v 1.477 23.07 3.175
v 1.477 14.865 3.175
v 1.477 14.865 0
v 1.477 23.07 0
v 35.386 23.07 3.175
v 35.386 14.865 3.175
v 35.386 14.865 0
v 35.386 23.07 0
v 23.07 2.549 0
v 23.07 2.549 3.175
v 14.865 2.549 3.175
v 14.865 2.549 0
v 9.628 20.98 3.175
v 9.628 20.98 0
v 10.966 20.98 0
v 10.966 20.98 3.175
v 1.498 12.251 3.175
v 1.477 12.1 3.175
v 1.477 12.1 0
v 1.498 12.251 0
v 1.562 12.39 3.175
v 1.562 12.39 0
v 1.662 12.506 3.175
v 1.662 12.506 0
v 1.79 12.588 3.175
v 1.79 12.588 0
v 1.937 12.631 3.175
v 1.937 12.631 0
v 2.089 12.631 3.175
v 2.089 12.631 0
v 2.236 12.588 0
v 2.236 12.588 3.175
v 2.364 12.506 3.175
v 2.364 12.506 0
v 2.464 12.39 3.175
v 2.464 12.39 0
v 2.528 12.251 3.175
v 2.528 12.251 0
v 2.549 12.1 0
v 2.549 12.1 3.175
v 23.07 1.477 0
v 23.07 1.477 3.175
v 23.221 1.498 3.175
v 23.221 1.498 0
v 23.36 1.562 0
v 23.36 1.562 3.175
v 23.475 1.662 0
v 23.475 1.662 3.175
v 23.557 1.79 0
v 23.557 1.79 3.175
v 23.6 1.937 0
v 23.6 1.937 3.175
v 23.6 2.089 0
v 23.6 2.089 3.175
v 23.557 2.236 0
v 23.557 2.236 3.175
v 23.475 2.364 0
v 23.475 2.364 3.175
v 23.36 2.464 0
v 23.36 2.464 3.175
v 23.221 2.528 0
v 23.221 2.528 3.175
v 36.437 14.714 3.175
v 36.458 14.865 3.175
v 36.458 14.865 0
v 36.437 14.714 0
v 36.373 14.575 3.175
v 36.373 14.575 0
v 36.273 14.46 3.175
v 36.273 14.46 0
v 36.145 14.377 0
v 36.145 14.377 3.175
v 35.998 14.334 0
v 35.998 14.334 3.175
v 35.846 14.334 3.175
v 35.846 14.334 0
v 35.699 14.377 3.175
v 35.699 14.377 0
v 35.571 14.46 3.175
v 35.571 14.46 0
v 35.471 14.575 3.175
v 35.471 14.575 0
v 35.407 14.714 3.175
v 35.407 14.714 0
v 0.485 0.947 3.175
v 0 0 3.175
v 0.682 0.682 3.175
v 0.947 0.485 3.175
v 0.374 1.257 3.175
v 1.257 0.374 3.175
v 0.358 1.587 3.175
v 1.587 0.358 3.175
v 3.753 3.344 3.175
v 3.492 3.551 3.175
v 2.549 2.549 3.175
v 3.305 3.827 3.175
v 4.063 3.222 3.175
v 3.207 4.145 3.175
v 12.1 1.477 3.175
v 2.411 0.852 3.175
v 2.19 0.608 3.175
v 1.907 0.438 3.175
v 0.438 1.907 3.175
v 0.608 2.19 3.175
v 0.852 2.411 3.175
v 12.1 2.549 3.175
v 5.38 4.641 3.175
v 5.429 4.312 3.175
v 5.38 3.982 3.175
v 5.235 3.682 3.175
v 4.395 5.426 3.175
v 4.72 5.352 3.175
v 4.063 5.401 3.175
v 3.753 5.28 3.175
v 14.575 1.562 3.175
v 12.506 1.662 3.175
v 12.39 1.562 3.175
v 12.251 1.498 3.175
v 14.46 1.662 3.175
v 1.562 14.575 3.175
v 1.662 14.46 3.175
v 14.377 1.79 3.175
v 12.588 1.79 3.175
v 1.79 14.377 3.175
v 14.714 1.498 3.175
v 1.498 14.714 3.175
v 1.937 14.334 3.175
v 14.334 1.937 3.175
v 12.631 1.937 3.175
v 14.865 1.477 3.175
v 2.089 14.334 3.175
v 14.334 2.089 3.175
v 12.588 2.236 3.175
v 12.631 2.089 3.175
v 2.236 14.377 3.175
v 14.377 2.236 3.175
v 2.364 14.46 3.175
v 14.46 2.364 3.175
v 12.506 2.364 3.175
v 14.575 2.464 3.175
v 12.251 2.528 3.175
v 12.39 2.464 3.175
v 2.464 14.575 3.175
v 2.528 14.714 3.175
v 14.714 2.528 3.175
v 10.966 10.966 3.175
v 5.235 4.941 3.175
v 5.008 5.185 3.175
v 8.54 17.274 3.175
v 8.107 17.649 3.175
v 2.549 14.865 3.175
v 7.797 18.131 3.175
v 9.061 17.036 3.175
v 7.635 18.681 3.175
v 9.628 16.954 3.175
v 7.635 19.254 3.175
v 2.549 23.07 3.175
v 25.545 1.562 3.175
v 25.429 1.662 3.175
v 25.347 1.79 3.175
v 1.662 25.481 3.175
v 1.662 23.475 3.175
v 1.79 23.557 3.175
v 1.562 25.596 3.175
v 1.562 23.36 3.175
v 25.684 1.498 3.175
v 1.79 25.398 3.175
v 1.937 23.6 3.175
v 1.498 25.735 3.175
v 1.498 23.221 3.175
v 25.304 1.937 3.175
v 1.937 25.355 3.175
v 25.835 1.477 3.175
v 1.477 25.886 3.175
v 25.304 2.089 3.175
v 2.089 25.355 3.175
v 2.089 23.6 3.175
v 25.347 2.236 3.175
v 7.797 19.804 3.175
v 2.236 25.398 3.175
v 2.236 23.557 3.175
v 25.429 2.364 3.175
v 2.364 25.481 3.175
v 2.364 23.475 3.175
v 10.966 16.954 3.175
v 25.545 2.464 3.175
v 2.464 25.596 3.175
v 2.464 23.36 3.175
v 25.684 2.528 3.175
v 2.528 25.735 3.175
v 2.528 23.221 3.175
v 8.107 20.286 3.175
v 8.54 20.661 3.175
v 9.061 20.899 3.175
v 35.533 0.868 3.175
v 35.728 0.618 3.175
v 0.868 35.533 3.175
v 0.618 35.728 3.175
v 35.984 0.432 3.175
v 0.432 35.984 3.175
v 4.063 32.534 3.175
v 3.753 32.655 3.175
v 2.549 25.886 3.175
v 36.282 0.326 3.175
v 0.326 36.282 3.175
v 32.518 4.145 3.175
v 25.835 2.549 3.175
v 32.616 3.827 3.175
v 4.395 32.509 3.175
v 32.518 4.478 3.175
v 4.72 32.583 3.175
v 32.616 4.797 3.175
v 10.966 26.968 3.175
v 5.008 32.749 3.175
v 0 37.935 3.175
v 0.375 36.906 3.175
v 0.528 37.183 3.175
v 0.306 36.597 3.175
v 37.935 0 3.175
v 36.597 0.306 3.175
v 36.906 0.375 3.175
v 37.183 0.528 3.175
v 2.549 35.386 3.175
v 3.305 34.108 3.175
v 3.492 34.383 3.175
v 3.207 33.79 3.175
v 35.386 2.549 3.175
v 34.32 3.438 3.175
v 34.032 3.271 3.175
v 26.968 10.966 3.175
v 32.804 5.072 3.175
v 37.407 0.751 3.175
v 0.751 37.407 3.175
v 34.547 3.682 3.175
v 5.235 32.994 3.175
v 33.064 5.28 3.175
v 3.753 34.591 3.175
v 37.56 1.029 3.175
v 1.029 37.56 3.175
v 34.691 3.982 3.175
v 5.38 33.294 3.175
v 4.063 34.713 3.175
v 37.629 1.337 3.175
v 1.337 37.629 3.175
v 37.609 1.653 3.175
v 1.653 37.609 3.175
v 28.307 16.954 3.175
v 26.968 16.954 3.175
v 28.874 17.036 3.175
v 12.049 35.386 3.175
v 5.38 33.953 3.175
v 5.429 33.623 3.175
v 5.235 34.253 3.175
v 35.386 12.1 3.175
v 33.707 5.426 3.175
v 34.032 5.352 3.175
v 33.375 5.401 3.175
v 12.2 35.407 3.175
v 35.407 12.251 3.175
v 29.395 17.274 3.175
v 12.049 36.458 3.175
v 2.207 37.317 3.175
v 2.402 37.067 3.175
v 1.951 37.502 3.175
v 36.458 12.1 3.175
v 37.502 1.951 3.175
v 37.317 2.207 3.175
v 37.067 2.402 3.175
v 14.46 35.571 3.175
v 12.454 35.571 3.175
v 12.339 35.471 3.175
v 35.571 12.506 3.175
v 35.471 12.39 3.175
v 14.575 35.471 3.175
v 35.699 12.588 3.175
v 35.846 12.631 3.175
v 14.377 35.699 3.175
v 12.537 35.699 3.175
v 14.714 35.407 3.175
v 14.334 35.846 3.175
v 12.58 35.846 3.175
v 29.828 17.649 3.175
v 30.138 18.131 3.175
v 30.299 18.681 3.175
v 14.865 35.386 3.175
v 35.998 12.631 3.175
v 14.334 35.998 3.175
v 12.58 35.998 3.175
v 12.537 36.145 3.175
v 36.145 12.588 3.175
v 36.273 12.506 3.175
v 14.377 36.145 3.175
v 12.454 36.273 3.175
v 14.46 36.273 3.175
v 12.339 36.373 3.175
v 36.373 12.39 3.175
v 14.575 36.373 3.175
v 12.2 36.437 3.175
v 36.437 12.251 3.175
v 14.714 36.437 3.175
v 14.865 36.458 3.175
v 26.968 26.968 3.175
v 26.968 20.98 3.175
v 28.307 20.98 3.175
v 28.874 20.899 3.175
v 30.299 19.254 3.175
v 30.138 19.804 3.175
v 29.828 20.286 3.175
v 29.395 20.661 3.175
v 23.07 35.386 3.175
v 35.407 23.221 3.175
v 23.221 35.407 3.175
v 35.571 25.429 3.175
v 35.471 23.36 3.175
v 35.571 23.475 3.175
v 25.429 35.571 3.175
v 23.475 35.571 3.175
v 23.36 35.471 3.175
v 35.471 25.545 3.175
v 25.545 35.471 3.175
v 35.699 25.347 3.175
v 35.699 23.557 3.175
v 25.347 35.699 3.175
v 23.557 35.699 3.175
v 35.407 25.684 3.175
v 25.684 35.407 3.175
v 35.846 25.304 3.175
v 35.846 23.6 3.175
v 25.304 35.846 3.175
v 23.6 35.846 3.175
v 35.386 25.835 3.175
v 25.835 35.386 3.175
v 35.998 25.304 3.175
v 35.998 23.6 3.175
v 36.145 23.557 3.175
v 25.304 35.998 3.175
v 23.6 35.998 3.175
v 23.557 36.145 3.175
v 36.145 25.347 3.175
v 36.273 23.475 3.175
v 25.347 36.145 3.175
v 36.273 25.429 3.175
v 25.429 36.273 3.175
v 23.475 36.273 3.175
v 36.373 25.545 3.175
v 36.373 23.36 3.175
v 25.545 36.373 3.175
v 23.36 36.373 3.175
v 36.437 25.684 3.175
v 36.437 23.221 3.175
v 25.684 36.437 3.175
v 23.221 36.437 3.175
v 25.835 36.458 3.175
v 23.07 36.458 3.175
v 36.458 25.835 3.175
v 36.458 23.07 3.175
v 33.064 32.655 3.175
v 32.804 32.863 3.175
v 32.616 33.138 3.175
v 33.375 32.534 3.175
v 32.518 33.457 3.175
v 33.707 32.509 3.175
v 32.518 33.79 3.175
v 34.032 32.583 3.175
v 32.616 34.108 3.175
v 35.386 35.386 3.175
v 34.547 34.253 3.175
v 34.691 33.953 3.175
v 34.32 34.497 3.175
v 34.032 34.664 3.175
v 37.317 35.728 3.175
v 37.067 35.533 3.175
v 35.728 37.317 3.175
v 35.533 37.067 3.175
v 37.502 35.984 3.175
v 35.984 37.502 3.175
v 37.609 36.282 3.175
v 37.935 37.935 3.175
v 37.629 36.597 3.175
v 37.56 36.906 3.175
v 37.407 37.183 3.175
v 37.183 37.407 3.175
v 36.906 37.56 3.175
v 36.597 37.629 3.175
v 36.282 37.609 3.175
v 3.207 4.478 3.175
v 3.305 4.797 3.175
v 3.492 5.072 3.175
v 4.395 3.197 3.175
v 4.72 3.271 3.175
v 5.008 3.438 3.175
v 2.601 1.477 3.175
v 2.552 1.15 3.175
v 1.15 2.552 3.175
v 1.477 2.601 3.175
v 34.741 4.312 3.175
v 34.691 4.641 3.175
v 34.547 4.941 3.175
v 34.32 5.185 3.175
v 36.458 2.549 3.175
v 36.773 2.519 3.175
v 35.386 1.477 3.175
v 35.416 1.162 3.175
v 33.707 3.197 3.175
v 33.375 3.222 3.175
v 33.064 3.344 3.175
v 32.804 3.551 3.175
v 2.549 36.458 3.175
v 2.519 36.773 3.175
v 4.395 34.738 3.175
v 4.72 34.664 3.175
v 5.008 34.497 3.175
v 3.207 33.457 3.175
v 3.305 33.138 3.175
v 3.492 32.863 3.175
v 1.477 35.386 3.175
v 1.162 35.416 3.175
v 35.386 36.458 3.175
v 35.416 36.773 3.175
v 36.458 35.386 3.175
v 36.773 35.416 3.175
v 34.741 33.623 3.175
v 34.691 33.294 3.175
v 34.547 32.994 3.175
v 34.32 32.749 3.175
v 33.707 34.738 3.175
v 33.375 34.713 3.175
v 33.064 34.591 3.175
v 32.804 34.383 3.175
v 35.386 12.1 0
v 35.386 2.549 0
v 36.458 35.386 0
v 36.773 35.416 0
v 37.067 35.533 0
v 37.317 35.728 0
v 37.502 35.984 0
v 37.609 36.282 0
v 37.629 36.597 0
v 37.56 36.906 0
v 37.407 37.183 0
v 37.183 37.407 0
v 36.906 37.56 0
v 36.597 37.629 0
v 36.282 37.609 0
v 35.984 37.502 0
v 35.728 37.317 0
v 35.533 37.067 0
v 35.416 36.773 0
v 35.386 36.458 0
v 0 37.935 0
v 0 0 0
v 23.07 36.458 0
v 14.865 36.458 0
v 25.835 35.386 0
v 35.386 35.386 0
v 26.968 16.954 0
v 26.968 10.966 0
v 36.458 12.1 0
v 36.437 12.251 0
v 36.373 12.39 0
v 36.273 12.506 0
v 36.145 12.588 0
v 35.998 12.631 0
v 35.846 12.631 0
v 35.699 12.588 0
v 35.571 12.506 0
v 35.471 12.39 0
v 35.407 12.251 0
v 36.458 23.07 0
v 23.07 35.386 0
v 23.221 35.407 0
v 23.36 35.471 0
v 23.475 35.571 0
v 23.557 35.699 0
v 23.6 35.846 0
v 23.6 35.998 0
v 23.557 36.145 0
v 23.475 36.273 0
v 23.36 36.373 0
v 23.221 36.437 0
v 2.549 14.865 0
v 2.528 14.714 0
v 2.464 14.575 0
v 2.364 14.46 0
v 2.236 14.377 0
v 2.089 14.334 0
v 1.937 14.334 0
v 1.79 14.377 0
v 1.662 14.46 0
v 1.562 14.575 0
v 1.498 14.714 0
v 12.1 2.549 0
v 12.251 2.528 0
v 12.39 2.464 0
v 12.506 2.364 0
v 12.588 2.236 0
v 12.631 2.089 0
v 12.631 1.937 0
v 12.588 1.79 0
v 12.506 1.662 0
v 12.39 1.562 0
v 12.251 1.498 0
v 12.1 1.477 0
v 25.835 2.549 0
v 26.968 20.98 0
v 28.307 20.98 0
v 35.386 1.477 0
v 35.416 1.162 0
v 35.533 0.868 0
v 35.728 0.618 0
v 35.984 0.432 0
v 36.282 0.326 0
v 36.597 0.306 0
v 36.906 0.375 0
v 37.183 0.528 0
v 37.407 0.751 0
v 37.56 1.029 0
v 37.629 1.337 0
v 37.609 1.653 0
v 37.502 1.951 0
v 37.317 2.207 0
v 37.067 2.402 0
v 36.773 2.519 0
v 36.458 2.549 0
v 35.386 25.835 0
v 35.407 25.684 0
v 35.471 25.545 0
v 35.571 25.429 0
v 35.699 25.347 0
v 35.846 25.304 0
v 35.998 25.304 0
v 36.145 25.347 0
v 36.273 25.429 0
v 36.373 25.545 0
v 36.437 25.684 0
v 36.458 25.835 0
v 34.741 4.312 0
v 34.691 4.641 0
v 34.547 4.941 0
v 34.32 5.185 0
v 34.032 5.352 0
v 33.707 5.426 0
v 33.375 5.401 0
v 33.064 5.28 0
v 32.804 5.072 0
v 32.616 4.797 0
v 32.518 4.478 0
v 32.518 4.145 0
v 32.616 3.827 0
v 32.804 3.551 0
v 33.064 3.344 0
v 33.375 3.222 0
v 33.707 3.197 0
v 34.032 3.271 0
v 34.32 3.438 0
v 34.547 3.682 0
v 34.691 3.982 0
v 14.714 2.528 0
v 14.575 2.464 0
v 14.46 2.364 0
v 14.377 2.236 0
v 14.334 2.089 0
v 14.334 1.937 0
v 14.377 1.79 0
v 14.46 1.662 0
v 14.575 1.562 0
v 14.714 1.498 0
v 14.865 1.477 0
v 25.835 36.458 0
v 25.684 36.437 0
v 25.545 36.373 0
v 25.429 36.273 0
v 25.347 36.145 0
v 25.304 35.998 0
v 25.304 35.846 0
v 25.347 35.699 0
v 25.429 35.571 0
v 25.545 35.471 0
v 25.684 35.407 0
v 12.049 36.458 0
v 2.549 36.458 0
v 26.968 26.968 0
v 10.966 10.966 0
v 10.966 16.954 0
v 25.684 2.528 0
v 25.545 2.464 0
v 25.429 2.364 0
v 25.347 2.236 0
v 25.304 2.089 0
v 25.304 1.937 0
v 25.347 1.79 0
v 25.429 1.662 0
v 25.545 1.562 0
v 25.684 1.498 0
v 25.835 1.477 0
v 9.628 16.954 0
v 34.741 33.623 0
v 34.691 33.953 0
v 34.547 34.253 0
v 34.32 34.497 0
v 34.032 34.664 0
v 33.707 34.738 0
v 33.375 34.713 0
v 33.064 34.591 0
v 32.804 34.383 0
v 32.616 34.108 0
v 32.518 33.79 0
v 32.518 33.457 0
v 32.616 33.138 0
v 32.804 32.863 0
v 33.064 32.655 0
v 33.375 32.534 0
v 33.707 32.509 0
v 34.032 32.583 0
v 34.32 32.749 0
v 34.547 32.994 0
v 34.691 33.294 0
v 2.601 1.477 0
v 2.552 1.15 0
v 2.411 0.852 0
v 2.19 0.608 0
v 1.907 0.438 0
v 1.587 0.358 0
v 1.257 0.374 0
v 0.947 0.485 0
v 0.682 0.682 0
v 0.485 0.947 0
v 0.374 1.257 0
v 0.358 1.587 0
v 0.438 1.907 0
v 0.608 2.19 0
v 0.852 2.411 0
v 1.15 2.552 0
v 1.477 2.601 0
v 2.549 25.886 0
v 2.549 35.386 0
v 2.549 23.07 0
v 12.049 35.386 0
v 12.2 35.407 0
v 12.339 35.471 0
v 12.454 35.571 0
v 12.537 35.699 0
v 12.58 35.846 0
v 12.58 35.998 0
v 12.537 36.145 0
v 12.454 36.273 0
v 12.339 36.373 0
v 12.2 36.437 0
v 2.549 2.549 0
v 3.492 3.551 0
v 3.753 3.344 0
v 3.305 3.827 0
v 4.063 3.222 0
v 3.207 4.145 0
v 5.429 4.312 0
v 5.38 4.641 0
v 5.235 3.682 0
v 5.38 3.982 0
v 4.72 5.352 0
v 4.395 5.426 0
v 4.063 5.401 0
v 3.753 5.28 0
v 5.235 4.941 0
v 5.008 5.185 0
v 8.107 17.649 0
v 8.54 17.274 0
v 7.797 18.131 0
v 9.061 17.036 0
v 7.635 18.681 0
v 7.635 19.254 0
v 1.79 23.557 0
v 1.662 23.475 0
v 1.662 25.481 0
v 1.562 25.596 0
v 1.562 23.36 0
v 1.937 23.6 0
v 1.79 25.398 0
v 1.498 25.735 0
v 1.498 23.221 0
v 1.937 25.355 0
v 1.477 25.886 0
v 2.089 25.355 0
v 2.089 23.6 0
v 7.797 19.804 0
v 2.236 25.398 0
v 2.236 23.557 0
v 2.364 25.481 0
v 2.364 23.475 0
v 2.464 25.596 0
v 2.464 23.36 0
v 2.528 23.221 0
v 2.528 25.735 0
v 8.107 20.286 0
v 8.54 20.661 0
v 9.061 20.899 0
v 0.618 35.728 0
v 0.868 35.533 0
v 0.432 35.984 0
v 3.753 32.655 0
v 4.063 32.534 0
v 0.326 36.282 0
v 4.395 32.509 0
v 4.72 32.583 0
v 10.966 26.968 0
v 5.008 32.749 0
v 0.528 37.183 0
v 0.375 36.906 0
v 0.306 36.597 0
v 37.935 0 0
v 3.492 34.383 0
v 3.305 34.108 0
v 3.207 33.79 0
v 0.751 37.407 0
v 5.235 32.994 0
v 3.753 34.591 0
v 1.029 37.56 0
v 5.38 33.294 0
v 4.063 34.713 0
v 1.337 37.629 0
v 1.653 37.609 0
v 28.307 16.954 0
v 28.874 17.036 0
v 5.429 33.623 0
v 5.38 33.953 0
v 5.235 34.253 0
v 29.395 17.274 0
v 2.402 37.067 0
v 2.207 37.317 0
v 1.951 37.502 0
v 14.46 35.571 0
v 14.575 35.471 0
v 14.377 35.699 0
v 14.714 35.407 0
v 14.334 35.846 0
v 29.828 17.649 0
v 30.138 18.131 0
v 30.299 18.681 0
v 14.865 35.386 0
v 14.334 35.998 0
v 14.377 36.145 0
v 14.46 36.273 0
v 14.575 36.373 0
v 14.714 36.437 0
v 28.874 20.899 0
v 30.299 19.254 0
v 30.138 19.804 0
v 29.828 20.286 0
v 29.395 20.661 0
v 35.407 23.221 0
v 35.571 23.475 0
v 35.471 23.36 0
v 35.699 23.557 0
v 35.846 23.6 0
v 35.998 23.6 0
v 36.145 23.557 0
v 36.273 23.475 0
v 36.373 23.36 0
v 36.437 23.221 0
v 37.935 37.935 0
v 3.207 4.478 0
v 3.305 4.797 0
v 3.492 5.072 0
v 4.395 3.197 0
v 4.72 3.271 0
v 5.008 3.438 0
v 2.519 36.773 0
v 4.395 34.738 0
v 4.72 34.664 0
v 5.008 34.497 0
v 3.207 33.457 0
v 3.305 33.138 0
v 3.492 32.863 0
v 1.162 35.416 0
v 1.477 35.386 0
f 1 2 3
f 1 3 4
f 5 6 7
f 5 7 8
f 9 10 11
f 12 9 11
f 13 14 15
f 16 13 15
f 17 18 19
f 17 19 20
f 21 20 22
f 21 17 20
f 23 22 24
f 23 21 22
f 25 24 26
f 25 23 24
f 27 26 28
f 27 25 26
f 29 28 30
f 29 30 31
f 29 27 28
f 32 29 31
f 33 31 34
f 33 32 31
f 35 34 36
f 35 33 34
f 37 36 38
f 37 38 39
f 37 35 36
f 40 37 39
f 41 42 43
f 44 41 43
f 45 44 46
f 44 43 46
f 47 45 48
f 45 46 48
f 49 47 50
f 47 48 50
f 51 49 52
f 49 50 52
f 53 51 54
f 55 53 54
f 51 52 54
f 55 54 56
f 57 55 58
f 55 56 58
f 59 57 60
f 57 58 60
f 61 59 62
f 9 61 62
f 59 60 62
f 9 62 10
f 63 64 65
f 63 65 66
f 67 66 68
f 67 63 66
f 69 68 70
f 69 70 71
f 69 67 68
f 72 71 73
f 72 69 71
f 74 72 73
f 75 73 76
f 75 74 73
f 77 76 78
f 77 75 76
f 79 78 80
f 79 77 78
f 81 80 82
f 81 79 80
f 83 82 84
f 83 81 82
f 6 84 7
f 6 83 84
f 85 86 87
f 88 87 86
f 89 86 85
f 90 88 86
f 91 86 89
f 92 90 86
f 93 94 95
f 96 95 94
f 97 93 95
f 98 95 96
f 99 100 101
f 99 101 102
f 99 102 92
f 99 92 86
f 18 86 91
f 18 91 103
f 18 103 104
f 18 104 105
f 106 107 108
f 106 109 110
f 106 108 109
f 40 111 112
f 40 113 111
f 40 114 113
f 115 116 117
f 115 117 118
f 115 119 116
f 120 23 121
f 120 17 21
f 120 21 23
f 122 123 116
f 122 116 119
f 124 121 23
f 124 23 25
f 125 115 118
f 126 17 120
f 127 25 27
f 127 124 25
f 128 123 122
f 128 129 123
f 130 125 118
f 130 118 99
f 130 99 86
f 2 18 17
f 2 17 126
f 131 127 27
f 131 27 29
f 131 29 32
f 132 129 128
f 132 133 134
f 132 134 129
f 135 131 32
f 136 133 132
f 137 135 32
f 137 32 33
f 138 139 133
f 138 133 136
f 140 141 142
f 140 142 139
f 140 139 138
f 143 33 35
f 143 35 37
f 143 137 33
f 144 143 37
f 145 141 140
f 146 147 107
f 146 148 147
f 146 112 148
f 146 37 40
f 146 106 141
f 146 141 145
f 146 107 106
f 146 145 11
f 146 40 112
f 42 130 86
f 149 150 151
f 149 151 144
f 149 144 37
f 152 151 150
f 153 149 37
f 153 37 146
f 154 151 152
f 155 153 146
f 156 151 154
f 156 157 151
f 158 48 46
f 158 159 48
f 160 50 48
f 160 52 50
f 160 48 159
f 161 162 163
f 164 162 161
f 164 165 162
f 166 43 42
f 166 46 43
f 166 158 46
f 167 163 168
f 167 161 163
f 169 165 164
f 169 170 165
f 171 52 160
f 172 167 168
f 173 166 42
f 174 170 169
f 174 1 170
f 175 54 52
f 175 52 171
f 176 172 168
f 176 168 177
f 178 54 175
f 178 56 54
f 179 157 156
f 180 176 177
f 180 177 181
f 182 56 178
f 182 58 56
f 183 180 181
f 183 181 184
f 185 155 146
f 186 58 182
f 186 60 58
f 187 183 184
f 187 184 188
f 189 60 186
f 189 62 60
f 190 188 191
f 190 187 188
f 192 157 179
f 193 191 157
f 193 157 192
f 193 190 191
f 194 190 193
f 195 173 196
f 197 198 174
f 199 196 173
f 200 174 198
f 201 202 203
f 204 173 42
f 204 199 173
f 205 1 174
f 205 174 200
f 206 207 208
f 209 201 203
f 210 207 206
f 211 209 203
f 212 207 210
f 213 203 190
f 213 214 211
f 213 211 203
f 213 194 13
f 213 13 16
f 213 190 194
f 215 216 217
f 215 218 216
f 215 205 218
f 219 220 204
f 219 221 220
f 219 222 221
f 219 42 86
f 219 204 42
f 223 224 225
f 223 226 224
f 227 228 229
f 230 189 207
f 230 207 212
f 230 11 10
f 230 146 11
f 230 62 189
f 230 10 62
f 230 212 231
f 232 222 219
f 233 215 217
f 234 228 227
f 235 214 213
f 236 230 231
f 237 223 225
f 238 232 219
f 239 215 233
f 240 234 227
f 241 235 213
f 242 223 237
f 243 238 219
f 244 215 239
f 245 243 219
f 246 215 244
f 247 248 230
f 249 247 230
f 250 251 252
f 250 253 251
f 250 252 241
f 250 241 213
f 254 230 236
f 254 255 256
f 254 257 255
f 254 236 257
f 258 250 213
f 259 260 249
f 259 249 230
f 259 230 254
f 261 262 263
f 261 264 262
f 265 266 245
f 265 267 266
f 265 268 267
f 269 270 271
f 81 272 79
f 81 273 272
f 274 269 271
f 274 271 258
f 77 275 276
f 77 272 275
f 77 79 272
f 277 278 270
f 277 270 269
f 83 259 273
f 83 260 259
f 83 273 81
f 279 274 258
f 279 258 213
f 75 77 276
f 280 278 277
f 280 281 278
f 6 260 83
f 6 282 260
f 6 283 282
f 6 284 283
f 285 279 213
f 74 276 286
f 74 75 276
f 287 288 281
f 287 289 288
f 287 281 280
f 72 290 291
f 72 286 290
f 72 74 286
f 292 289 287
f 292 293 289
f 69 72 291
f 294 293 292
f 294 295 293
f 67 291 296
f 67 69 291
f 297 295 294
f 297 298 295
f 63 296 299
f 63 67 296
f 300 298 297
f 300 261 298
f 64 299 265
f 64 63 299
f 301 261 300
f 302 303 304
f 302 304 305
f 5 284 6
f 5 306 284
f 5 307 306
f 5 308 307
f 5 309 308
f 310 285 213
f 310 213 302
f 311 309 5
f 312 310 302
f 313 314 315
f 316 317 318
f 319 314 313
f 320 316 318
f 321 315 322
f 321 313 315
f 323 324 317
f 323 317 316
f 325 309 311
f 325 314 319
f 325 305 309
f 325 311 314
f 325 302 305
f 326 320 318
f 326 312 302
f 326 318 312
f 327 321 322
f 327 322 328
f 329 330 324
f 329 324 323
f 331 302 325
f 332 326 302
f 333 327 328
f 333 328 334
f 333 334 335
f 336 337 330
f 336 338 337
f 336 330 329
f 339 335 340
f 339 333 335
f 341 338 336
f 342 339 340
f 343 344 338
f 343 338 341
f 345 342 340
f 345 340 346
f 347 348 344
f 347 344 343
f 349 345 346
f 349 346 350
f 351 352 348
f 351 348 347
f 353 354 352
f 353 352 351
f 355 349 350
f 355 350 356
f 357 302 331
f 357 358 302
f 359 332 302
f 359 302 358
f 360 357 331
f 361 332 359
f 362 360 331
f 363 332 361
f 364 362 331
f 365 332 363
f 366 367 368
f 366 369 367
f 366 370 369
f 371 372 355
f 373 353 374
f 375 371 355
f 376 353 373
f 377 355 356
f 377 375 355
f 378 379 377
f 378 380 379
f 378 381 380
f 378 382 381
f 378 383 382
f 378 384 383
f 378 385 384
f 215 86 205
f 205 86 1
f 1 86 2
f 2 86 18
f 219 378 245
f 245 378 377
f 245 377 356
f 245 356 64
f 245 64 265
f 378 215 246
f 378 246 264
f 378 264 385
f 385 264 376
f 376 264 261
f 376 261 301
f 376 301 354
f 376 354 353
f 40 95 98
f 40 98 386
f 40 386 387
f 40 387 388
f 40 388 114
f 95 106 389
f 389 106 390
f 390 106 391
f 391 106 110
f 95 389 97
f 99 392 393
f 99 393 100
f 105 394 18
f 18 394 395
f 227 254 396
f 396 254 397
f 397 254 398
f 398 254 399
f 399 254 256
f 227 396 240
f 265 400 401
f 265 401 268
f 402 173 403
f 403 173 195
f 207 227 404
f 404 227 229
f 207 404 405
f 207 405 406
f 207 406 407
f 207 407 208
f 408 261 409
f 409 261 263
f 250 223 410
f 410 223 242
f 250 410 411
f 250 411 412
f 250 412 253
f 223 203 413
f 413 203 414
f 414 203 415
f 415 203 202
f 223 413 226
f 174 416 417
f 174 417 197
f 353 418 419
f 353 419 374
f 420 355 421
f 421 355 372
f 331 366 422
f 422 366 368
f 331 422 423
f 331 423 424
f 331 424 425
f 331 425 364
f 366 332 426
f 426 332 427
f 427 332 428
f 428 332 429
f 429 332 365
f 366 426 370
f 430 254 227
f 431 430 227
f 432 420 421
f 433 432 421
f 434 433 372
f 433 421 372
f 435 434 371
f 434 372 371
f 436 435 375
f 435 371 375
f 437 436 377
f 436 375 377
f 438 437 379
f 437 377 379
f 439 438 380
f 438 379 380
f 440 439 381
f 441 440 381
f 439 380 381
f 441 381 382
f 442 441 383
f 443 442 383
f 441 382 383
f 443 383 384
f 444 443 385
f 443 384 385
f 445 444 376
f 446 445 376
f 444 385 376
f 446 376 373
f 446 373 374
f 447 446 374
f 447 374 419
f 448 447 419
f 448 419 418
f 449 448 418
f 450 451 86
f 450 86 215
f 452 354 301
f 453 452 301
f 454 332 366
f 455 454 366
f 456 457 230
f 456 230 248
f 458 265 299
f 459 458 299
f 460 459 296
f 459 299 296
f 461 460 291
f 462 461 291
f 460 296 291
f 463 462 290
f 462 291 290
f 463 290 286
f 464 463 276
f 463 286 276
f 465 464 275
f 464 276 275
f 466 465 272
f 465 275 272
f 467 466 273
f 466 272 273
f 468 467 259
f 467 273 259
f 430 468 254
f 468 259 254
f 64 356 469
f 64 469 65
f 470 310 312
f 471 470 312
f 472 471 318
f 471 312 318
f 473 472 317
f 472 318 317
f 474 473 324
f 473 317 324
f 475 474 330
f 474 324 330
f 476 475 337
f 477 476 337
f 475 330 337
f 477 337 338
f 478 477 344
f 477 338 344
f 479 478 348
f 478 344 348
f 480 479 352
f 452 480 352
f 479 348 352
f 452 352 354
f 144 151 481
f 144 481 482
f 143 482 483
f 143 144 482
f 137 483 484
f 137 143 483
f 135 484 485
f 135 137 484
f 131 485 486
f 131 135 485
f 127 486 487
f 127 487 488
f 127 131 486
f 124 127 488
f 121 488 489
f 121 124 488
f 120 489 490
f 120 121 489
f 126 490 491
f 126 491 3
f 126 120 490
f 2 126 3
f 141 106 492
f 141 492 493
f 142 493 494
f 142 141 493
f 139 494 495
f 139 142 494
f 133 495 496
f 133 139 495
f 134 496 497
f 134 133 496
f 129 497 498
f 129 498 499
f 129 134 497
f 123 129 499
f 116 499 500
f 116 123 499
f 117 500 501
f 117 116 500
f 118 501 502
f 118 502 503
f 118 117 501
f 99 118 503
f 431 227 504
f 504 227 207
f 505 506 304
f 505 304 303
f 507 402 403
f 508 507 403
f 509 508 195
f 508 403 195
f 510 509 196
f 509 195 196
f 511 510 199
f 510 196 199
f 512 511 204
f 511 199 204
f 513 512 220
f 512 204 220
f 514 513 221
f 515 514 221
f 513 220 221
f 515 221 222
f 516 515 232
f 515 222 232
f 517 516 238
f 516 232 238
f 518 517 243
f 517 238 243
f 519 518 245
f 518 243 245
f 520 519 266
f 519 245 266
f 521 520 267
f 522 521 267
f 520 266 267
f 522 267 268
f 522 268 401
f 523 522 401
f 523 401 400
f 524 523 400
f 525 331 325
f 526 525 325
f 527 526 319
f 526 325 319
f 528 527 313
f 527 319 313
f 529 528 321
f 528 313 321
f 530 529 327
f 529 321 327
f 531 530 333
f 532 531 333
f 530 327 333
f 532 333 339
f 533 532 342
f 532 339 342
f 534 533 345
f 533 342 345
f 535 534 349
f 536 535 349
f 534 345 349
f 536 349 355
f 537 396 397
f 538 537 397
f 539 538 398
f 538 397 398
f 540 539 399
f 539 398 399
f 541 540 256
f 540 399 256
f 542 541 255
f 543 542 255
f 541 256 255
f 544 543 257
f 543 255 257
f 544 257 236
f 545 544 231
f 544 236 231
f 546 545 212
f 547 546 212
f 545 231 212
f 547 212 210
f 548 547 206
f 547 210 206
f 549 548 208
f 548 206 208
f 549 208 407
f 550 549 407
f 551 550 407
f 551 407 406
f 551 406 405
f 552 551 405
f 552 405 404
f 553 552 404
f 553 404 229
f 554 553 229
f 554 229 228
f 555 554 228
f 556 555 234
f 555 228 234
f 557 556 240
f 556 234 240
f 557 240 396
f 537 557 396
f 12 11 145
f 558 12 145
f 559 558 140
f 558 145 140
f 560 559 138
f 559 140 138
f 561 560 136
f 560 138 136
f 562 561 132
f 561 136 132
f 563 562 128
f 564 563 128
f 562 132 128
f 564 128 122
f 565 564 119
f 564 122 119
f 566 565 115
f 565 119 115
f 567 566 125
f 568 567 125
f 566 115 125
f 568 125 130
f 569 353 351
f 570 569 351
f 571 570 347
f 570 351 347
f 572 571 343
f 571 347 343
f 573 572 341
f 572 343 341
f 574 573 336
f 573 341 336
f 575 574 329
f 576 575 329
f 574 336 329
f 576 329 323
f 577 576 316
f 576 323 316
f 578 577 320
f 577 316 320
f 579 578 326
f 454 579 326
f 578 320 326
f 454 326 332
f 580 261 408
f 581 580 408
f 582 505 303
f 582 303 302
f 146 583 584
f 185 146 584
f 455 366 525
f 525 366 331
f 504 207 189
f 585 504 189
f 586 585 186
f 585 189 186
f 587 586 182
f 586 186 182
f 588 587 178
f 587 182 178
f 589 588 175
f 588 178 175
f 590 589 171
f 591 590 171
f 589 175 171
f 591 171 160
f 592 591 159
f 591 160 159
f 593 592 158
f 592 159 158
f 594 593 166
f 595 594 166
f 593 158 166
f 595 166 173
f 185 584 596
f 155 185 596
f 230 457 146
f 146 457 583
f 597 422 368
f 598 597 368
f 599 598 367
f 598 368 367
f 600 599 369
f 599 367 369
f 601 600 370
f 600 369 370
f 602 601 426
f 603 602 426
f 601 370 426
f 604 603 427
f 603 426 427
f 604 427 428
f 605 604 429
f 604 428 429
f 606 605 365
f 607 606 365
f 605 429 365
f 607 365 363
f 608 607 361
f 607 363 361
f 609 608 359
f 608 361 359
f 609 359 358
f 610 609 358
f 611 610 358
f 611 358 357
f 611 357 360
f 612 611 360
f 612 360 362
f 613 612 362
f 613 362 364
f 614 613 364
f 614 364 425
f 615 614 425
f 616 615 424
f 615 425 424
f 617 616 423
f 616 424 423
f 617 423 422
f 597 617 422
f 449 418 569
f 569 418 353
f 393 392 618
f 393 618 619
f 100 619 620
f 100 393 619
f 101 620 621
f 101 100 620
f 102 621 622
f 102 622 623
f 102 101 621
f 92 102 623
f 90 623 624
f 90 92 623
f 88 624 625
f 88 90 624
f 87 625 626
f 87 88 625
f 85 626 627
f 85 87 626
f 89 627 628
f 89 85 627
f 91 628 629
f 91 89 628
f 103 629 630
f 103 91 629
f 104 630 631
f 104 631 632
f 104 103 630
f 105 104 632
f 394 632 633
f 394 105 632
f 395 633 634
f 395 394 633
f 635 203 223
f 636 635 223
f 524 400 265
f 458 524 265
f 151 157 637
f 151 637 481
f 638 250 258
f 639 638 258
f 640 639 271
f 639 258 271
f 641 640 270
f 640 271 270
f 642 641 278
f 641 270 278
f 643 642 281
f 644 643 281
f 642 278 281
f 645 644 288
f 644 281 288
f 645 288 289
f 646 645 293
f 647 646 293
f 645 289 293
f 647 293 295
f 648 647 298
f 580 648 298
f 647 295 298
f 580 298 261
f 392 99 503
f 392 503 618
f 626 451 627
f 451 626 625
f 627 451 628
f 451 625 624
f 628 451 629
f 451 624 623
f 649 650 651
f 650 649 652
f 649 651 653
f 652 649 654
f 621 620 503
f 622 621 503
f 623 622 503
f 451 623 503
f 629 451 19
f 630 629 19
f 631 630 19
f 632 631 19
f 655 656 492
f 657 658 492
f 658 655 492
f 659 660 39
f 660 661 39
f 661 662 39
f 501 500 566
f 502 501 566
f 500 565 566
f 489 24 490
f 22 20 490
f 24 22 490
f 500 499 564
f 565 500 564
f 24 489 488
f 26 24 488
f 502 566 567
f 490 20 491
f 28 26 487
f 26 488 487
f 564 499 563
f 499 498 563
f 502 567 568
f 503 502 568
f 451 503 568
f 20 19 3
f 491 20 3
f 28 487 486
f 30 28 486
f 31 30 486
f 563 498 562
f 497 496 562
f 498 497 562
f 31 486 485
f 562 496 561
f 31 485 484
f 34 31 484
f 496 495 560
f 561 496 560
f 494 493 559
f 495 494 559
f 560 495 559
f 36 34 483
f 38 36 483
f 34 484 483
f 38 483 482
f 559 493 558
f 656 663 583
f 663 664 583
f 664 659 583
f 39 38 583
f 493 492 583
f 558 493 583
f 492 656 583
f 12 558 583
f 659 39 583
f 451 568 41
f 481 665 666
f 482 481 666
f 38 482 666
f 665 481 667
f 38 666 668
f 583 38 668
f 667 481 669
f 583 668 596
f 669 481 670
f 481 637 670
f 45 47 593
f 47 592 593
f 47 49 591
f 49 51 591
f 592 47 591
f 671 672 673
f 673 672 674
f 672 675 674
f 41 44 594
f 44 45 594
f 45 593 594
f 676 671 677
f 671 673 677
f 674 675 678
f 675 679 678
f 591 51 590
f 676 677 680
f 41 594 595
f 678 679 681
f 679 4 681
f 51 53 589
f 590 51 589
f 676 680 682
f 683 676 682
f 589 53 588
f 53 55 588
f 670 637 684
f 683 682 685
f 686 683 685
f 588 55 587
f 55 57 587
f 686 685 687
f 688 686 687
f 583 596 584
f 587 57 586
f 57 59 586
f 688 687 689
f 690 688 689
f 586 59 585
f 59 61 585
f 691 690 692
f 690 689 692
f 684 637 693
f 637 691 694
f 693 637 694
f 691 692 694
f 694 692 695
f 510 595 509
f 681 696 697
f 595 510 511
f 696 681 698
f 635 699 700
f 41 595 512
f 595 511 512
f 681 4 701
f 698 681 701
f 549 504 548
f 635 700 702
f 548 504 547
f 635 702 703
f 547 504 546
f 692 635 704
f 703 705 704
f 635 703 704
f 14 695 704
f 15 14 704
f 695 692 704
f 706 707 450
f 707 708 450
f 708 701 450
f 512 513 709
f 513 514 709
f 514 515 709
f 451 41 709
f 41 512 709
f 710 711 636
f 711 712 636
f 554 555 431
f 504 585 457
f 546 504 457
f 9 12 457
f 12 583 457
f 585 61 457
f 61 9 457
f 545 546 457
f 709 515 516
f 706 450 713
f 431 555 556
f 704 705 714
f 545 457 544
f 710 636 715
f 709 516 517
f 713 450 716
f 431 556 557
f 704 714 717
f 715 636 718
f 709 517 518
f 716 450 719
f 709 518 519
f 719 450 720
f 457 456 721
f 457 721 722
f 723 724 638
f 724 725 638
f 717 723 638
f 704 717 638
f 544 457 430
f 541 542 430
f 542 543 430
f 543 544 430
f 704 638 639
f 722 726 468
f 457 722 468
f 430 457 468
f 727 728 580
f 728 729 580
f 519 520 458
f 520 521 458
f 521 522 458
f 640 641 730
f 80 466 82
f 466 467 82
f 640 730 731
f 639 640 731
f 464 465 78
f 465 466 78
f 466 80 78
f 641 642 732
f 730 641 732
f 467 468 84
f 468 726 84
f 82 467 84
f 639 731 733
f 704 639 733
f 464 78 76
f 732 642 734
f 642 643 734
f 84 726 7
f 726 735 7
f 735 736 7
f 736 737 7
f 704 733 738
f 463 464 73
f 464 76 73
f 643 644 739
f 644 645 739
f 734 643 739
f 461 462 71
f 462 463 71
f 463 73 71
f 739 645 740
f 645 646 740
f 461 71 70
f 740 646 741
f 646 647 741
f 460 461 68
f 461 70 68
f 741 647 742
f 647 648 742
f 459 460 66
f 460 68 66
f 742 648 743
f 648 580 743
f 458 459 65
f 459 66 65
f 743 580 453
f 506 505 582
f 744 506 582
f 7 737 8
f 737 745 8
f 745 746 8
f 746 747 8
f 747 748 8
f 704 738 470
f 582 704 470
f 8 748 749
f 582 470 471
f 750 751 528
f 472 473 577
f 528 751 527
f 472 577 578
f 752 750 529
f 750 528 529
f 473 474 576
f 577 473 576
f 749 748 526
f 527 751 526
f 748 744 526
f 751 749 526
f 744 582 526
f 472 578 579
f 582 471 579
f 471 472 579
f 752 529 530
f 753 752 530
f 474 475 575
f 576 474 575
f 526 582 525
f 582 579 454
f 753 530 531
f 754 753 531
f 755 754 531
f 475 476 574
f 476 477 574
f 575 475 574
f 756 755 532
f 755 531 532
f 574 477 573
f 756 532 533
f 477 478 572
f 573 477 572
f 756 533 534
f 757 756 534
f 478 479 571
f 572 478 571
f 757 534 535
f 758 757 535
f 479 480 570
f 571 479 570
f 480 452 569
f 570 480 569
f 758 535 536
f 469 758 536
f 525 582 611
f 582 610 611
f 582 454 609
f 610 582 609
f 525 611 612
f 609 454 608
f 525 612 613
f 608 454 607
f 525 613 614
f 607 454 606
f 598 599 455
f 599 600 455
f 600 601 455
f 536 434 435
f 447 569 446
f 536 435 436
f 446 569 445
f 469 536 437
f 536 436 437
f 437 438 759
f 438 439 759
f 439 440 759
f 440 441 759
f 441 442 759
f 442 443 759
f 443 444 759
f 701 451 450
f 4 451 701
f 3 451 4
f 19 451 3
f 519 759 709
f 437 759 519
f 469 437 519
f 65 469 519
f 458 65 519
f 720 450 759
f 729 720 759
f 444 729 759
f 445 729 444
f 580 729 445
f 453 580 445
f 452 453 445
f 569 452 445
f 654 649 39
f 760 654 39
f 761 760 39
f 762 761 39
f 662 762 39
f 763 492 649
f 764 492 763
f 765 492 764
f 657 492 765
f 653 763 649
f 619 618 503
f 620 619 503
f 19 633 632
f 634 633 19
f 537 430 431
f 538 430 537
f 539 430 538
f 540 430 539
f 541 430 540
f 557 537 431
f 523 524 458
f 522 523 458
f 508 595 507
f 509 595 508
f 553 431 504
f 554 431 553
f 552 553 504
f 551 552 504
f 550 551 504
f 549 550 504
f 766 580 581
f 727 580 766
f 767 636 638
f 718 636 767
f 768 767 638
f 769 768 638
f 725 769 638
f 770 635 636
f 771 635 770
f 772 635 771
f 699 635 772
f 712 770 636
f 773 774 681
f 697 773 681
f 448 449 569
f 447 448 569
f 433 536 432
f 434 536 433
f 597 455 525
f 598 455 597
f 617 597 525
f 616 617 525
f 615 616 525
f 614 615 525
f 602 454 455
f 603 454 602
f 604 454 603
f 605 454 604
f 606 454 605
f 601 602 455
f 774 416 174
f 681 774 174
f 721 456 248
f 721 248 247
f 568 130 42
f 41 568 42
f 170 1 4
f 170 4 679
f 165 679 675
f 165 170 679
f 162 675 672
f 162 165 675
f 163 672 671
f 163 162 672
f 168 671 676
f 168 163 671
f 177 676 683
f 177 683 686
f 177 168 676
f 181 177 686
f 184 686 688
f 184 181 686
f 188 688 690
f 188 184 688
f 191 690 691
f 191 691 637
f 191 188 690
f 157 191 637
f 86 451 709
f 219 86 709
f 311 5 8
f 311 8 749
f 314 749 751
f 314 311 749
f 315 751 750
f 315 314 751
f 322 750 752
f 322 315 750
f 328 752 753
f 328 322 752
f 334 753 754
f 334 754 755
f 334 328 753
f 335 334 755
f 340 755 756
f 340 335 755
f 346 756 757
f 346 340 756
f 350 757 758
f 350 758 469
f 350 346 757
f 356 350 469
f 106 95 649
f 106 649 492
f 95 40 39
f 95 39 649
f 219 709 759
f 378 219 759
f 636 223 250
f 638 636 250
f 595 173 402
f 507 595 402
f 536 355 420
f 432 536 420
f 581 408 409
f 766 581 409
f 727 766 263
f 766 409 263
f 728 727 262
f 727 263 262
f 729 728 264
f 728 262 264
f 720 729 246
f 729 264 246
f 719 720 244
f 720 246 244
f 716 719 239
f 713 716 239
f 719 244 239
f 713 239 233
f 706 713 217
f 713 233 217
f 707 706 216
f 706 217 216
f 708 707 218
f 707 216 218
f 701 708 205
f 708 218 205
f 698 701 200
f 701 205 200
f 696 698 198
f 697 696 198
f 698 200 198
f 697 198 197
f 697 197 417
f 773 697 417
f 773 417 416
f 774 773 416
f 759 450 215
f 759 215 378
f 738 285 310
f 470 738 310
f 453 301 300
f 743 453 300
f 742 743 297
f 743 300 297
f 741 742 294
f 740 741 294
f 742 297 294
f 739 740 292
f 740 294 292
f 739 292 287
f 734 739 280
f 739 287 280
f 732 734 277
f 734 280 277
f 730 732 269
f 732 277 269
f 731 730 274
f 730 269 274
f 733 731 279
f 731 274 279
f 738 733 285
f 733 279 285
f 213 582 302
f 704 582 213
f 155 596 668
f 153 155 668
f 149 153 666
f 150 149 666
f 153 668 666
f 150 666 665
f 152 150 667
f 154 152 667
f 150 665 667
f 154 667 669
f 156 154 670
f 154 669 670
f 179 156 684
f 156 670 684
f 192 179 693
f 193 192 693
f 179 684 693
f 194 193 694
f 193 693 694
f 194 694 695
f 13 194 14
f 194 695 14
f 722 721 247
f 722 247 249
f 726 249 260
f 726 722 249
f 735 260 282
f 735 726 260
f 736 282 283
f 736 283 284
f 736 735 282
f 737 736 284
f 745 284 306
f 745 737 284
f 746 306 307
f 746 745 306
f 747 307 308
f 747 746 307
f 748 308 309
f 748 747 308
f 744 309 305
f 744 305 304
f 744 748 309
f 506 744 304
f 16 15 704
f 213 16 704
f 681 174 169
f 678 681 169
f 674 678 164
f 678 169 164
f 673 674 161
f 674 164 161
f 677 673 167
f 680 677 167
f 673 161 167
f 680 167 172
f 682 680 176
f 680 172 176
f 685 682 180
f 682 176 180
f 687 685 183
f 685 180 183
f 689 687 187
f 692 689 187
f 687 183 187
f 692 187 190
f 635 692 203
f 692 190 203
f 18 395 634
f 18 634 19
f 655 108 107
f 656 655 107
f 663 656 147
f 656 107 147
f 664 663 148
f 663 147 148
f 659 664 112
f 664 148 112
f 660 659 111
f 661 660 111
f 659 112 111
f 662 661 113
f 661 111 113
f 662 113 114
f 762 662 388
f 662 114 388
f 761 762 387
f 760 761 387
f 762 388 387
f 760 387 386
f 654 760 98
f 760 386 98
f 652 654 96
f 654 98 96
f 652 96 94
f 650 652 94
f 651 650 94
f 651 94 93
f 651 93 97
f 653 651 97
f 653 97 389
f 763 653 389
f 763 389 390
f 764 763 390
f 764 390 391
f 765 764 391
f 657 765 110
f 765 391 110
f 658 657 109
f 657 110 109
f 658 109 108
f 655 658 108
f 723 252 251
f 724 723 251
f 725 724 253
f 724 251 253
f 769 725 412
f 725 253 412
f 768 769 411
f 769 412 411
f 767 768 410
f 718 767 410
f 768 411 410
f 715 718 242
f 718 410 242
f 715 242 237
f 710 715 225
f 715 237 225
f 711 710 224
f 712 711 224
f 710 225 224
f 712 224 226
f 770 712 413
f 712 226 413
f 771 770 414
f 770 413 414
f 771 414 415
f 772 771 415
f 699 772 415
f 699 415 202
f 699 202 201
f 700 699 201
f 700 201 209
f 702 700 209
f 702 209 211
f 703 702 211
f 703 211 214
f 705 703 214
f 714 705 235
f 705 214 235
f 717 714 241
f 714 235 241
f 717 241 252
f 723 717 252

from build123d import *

# Parameters (mm, degrees)
SKETCH1_W           = 37.9349
SKETCH1_H           = 37.9349
BOSS_EXTRUDE1_DEPTH = 3.175
SKETCH9_R           = 1.1176
CUT_EXTRUDE2_DEPTH  = 3.175
SKETCH10_W          = 16.002
SKETCH10_H          = 16.002
CUT_EXTRUDE3_DEPTH  = 3.175
CUT_EXTRUDE4_DEPTH  = 3.175


with BuildPart() as part:
    # Sketch1 → Boss-Extrude1 (new body)
    with BuildSketch(Plane.XY):
        with Locations((18.96745, 18.96745)):
            Rectangle(SKETCH1_W, SKETCH1_H)
    extrude(amount=BOSS_EXTRUDE1_DEPTH)

    # Sketch9 → Cut-Extrude2 (cut)
    with BuildSketch(Plane.XY.offset(3.175)):
        with Locations((33.62325, 33.62325)):
            Circle(SKETCH9_R)
        with Locations((4.31165, 33.62325)):
            Circle(SKETCH9_R)
        with Locations((4.31165, 4.31165)):
            Circle(SKETCH9_R)
        with Locations((33.62325, 4.31165)):
            Circle(SKETCH9_R)
        with BuildLine():
            Line((35.385619933, 12.100169933), (35.385619933, 2.549280067))
            Line((35.385619933, 2.549280067), (25.834730067, 2.549280067))
            ThreePointArc((25.834730067, 2.549280067), (25.2984, 2.01295), (25.834730067, 1.476619933))
            Line((25.834730067, 1.476619933), (35.385619933, 1.476619933))
            ThreePointArc((35.385619933, 1.476619933), (37.303202335, 0.631697665), (36.458280067, 2.549280067))
            Line((36.458280067, 2.549280067), (36.458280067, 12.100169933))
            ThreePointArc((36.458280067, 12.100169933), (35.92195, 12.6365), (35.385619933, 12.100169933))
        make_face()
        with BuildLine():
            Line((35.385619933, 36.458280067), (25.834730067, 36.458280067))
            ThreePointArc((25.834730067, 36.458280067), (25.2984, 35.92195), (25.834730067, 35.385619933))
            Line((25.834730067, 35.385619933), (35.385619933, 35.385619933))
            Line((35.385619933, 35.385619933), (35.385619933, 25.834730067))
            ThreePointArc((35.385619933, 25.834730067), (35.92195, 25.2984), (36.458280067, 25.834730067))
            Line((36.458280067, 25.834730067), (36.458280067, 35.385619933))
            ThreePointArc((36.458280067, 35.385619933), (37.303202335, 37.303202335), (35.385619933, 36.458280067))
        make_face()
        with BuildLine():
            Line((12.048880067, 36.458280067), (2.549280067, 36.458280067))
            ThreePointArc((2.549280067, 36.458280067), (0.631697665, 37.303202335), (1.476619933, 35.385619933))
            Line((1.476619933, 35.385619933), (1.476619933, 25.886019933))
            ThreePointArc((1.476619933, 25.886019933), (2.01295, 25.349689867), (2.549280067, 25.886019933))
            Line((2.549280067, 25.886019933), (2.549280067, 35.385619933))
            Line((2.549280067, 35.385619933), (12.048880067, 35.385619933))
            ThreePointArc((12.048880067, 35.385619933), (12.585210133, 35.92195), (12.048880067, 36.458280067))
        make_face()
        with BuildLine():
            Line((23.06955, 36.458280067), (14.86535, 36.458280067))
            ThreePointArc((14.86535, 36.458280067), (14.329019933, 35.92195), (14.86535, 35.385619933))
            Line((14.86535, 35.385619933), (23.06955, 35.385619933))
            ThreePointArc((23.06955, 35.385619933), (23.605880067, 35.92195), (23.06955, 36.458280067))
        make_face()
        with BuildLine():
            Line((2.549280067, 23.06955), (2.549280067, 14.86535))
            ThreePointArc((2.549280067, 14.86535), (2.01295, 14.329019933), (1.476619933, 14.86535))
            Line((1.476619933, 14.86535), (1.476619933, 23.06955))
            ThreePointArc((1.476619933, 23.06955), (2.01295, 23.605880067), (2.549280067, 23.06955))
        make_face()
        with BuildLine():
            Line((36.458280067, 23.06955), (36.458280067, 14.86535))
            ThreePointArc((36.458280067, 14.86535), (35.92195, 14.329019933), (35.385619933, 14.86535))
            Line((35.385619933, 14.86535), (35.385619933, 23.06955))
            ThreePointArc((35.385619933, 23.06955), (35.92195, 23.605880067), (36.458280067, 23.06955))
        make_face()
        with BuildLine():
            Line((23.06955, 2.549280067), (14.86535, 2.549280067))
            ThreePointArc((14.86535, 2.549280067), (14.329019933, 2.01295), (14.86535, 1.476619933))
            Line((14.86535, 1.476619933), (23.06955, 1.476619933))
            ThreePointArc((23.06955, 1.476619933), (23.605880067, 2.01295), (23.06955, 2.549280067))
        make_face()
        with BuildLine():
            Line((2.549280067, 12.100169933), (2.549280067, 2.549280067))
            Line((2.549280067, 2.549280067), (12.100169933, 2.549280067))
            ThreePointArc((12.100169933, 2.549280067), (12.6365, 2.01295), (12.100169933, 1.476619933))
            Line((12.100169933, 1.476619933), (2.600569933, 1.476619933))
            ThreePointArc((2.600569933, 1.476619933), (0.681867267, 0.681867267), (1.476619933, 2.600569933))
            Line((1.476619933, 2.600569933), (1.476619933, 12.100169933))
            ThreePointArc((1.476619933, 12.100169933), (2.01295, 12.6365), (2.549280067, 12.100169933))
        make_face()
    extrude(amount=-CUT_EXTRUDE2_DEPTH, mode=Mode.SUBTRACT)

    # Sketch10 → Cut-Extrude3 (cut)
    with BuildSketch(Plane(origin=(0, 0, 0), x_dir=(-1, 0, 0), z_dir=(0, 0, -1))):
        with Locations((-18.96745, 18.96745)):
            Rectangle(SKETCH10_W, SKETCH10_H)
    extrude(amount=-CUT_EXTRUDE3_DEPTH, mode=Mode.SUBTRACT)

    # Sketch11 → Cut-Extrude4 (cut)
    with BuildSketch(Plane(origin=(0, 0, 0), x_dir=(-1, 0, 0), z_dir=(0, 0, -1))):
        with BuildLine():
            Line((-10.96645, 16.9545), (-9.62787, 16.9545))
            ThreePointArc((-9.62787, 16.9545), (-7.61492, 18.96745), (-9.62787, 20.9804))
            Line((-9.62787, 20.9804), (-10.96645, 20.9804))
            Line((-10.96645, 20.9804), (-10.96645, 16.9545))
        make_face()
        with BuildLine():
            Line((-28.30703, 20.9804), (-26.96845, 20.9804))
            Line((-26.96845, 20.9804), (-26.96845, 16.9545))
            Line((-26.96845, 16.9545), (-28.30703, 16.9545))
            ThreePointArc((-28.30703, 16.9545), (-30.31998, 18.96745), (-28.30703, 20.9804))
        make_face()
    extrude(amount=-CUT_EXTRUDE4_DEPTH, mode=Mode.SUBTRACT)


solid = part.part
